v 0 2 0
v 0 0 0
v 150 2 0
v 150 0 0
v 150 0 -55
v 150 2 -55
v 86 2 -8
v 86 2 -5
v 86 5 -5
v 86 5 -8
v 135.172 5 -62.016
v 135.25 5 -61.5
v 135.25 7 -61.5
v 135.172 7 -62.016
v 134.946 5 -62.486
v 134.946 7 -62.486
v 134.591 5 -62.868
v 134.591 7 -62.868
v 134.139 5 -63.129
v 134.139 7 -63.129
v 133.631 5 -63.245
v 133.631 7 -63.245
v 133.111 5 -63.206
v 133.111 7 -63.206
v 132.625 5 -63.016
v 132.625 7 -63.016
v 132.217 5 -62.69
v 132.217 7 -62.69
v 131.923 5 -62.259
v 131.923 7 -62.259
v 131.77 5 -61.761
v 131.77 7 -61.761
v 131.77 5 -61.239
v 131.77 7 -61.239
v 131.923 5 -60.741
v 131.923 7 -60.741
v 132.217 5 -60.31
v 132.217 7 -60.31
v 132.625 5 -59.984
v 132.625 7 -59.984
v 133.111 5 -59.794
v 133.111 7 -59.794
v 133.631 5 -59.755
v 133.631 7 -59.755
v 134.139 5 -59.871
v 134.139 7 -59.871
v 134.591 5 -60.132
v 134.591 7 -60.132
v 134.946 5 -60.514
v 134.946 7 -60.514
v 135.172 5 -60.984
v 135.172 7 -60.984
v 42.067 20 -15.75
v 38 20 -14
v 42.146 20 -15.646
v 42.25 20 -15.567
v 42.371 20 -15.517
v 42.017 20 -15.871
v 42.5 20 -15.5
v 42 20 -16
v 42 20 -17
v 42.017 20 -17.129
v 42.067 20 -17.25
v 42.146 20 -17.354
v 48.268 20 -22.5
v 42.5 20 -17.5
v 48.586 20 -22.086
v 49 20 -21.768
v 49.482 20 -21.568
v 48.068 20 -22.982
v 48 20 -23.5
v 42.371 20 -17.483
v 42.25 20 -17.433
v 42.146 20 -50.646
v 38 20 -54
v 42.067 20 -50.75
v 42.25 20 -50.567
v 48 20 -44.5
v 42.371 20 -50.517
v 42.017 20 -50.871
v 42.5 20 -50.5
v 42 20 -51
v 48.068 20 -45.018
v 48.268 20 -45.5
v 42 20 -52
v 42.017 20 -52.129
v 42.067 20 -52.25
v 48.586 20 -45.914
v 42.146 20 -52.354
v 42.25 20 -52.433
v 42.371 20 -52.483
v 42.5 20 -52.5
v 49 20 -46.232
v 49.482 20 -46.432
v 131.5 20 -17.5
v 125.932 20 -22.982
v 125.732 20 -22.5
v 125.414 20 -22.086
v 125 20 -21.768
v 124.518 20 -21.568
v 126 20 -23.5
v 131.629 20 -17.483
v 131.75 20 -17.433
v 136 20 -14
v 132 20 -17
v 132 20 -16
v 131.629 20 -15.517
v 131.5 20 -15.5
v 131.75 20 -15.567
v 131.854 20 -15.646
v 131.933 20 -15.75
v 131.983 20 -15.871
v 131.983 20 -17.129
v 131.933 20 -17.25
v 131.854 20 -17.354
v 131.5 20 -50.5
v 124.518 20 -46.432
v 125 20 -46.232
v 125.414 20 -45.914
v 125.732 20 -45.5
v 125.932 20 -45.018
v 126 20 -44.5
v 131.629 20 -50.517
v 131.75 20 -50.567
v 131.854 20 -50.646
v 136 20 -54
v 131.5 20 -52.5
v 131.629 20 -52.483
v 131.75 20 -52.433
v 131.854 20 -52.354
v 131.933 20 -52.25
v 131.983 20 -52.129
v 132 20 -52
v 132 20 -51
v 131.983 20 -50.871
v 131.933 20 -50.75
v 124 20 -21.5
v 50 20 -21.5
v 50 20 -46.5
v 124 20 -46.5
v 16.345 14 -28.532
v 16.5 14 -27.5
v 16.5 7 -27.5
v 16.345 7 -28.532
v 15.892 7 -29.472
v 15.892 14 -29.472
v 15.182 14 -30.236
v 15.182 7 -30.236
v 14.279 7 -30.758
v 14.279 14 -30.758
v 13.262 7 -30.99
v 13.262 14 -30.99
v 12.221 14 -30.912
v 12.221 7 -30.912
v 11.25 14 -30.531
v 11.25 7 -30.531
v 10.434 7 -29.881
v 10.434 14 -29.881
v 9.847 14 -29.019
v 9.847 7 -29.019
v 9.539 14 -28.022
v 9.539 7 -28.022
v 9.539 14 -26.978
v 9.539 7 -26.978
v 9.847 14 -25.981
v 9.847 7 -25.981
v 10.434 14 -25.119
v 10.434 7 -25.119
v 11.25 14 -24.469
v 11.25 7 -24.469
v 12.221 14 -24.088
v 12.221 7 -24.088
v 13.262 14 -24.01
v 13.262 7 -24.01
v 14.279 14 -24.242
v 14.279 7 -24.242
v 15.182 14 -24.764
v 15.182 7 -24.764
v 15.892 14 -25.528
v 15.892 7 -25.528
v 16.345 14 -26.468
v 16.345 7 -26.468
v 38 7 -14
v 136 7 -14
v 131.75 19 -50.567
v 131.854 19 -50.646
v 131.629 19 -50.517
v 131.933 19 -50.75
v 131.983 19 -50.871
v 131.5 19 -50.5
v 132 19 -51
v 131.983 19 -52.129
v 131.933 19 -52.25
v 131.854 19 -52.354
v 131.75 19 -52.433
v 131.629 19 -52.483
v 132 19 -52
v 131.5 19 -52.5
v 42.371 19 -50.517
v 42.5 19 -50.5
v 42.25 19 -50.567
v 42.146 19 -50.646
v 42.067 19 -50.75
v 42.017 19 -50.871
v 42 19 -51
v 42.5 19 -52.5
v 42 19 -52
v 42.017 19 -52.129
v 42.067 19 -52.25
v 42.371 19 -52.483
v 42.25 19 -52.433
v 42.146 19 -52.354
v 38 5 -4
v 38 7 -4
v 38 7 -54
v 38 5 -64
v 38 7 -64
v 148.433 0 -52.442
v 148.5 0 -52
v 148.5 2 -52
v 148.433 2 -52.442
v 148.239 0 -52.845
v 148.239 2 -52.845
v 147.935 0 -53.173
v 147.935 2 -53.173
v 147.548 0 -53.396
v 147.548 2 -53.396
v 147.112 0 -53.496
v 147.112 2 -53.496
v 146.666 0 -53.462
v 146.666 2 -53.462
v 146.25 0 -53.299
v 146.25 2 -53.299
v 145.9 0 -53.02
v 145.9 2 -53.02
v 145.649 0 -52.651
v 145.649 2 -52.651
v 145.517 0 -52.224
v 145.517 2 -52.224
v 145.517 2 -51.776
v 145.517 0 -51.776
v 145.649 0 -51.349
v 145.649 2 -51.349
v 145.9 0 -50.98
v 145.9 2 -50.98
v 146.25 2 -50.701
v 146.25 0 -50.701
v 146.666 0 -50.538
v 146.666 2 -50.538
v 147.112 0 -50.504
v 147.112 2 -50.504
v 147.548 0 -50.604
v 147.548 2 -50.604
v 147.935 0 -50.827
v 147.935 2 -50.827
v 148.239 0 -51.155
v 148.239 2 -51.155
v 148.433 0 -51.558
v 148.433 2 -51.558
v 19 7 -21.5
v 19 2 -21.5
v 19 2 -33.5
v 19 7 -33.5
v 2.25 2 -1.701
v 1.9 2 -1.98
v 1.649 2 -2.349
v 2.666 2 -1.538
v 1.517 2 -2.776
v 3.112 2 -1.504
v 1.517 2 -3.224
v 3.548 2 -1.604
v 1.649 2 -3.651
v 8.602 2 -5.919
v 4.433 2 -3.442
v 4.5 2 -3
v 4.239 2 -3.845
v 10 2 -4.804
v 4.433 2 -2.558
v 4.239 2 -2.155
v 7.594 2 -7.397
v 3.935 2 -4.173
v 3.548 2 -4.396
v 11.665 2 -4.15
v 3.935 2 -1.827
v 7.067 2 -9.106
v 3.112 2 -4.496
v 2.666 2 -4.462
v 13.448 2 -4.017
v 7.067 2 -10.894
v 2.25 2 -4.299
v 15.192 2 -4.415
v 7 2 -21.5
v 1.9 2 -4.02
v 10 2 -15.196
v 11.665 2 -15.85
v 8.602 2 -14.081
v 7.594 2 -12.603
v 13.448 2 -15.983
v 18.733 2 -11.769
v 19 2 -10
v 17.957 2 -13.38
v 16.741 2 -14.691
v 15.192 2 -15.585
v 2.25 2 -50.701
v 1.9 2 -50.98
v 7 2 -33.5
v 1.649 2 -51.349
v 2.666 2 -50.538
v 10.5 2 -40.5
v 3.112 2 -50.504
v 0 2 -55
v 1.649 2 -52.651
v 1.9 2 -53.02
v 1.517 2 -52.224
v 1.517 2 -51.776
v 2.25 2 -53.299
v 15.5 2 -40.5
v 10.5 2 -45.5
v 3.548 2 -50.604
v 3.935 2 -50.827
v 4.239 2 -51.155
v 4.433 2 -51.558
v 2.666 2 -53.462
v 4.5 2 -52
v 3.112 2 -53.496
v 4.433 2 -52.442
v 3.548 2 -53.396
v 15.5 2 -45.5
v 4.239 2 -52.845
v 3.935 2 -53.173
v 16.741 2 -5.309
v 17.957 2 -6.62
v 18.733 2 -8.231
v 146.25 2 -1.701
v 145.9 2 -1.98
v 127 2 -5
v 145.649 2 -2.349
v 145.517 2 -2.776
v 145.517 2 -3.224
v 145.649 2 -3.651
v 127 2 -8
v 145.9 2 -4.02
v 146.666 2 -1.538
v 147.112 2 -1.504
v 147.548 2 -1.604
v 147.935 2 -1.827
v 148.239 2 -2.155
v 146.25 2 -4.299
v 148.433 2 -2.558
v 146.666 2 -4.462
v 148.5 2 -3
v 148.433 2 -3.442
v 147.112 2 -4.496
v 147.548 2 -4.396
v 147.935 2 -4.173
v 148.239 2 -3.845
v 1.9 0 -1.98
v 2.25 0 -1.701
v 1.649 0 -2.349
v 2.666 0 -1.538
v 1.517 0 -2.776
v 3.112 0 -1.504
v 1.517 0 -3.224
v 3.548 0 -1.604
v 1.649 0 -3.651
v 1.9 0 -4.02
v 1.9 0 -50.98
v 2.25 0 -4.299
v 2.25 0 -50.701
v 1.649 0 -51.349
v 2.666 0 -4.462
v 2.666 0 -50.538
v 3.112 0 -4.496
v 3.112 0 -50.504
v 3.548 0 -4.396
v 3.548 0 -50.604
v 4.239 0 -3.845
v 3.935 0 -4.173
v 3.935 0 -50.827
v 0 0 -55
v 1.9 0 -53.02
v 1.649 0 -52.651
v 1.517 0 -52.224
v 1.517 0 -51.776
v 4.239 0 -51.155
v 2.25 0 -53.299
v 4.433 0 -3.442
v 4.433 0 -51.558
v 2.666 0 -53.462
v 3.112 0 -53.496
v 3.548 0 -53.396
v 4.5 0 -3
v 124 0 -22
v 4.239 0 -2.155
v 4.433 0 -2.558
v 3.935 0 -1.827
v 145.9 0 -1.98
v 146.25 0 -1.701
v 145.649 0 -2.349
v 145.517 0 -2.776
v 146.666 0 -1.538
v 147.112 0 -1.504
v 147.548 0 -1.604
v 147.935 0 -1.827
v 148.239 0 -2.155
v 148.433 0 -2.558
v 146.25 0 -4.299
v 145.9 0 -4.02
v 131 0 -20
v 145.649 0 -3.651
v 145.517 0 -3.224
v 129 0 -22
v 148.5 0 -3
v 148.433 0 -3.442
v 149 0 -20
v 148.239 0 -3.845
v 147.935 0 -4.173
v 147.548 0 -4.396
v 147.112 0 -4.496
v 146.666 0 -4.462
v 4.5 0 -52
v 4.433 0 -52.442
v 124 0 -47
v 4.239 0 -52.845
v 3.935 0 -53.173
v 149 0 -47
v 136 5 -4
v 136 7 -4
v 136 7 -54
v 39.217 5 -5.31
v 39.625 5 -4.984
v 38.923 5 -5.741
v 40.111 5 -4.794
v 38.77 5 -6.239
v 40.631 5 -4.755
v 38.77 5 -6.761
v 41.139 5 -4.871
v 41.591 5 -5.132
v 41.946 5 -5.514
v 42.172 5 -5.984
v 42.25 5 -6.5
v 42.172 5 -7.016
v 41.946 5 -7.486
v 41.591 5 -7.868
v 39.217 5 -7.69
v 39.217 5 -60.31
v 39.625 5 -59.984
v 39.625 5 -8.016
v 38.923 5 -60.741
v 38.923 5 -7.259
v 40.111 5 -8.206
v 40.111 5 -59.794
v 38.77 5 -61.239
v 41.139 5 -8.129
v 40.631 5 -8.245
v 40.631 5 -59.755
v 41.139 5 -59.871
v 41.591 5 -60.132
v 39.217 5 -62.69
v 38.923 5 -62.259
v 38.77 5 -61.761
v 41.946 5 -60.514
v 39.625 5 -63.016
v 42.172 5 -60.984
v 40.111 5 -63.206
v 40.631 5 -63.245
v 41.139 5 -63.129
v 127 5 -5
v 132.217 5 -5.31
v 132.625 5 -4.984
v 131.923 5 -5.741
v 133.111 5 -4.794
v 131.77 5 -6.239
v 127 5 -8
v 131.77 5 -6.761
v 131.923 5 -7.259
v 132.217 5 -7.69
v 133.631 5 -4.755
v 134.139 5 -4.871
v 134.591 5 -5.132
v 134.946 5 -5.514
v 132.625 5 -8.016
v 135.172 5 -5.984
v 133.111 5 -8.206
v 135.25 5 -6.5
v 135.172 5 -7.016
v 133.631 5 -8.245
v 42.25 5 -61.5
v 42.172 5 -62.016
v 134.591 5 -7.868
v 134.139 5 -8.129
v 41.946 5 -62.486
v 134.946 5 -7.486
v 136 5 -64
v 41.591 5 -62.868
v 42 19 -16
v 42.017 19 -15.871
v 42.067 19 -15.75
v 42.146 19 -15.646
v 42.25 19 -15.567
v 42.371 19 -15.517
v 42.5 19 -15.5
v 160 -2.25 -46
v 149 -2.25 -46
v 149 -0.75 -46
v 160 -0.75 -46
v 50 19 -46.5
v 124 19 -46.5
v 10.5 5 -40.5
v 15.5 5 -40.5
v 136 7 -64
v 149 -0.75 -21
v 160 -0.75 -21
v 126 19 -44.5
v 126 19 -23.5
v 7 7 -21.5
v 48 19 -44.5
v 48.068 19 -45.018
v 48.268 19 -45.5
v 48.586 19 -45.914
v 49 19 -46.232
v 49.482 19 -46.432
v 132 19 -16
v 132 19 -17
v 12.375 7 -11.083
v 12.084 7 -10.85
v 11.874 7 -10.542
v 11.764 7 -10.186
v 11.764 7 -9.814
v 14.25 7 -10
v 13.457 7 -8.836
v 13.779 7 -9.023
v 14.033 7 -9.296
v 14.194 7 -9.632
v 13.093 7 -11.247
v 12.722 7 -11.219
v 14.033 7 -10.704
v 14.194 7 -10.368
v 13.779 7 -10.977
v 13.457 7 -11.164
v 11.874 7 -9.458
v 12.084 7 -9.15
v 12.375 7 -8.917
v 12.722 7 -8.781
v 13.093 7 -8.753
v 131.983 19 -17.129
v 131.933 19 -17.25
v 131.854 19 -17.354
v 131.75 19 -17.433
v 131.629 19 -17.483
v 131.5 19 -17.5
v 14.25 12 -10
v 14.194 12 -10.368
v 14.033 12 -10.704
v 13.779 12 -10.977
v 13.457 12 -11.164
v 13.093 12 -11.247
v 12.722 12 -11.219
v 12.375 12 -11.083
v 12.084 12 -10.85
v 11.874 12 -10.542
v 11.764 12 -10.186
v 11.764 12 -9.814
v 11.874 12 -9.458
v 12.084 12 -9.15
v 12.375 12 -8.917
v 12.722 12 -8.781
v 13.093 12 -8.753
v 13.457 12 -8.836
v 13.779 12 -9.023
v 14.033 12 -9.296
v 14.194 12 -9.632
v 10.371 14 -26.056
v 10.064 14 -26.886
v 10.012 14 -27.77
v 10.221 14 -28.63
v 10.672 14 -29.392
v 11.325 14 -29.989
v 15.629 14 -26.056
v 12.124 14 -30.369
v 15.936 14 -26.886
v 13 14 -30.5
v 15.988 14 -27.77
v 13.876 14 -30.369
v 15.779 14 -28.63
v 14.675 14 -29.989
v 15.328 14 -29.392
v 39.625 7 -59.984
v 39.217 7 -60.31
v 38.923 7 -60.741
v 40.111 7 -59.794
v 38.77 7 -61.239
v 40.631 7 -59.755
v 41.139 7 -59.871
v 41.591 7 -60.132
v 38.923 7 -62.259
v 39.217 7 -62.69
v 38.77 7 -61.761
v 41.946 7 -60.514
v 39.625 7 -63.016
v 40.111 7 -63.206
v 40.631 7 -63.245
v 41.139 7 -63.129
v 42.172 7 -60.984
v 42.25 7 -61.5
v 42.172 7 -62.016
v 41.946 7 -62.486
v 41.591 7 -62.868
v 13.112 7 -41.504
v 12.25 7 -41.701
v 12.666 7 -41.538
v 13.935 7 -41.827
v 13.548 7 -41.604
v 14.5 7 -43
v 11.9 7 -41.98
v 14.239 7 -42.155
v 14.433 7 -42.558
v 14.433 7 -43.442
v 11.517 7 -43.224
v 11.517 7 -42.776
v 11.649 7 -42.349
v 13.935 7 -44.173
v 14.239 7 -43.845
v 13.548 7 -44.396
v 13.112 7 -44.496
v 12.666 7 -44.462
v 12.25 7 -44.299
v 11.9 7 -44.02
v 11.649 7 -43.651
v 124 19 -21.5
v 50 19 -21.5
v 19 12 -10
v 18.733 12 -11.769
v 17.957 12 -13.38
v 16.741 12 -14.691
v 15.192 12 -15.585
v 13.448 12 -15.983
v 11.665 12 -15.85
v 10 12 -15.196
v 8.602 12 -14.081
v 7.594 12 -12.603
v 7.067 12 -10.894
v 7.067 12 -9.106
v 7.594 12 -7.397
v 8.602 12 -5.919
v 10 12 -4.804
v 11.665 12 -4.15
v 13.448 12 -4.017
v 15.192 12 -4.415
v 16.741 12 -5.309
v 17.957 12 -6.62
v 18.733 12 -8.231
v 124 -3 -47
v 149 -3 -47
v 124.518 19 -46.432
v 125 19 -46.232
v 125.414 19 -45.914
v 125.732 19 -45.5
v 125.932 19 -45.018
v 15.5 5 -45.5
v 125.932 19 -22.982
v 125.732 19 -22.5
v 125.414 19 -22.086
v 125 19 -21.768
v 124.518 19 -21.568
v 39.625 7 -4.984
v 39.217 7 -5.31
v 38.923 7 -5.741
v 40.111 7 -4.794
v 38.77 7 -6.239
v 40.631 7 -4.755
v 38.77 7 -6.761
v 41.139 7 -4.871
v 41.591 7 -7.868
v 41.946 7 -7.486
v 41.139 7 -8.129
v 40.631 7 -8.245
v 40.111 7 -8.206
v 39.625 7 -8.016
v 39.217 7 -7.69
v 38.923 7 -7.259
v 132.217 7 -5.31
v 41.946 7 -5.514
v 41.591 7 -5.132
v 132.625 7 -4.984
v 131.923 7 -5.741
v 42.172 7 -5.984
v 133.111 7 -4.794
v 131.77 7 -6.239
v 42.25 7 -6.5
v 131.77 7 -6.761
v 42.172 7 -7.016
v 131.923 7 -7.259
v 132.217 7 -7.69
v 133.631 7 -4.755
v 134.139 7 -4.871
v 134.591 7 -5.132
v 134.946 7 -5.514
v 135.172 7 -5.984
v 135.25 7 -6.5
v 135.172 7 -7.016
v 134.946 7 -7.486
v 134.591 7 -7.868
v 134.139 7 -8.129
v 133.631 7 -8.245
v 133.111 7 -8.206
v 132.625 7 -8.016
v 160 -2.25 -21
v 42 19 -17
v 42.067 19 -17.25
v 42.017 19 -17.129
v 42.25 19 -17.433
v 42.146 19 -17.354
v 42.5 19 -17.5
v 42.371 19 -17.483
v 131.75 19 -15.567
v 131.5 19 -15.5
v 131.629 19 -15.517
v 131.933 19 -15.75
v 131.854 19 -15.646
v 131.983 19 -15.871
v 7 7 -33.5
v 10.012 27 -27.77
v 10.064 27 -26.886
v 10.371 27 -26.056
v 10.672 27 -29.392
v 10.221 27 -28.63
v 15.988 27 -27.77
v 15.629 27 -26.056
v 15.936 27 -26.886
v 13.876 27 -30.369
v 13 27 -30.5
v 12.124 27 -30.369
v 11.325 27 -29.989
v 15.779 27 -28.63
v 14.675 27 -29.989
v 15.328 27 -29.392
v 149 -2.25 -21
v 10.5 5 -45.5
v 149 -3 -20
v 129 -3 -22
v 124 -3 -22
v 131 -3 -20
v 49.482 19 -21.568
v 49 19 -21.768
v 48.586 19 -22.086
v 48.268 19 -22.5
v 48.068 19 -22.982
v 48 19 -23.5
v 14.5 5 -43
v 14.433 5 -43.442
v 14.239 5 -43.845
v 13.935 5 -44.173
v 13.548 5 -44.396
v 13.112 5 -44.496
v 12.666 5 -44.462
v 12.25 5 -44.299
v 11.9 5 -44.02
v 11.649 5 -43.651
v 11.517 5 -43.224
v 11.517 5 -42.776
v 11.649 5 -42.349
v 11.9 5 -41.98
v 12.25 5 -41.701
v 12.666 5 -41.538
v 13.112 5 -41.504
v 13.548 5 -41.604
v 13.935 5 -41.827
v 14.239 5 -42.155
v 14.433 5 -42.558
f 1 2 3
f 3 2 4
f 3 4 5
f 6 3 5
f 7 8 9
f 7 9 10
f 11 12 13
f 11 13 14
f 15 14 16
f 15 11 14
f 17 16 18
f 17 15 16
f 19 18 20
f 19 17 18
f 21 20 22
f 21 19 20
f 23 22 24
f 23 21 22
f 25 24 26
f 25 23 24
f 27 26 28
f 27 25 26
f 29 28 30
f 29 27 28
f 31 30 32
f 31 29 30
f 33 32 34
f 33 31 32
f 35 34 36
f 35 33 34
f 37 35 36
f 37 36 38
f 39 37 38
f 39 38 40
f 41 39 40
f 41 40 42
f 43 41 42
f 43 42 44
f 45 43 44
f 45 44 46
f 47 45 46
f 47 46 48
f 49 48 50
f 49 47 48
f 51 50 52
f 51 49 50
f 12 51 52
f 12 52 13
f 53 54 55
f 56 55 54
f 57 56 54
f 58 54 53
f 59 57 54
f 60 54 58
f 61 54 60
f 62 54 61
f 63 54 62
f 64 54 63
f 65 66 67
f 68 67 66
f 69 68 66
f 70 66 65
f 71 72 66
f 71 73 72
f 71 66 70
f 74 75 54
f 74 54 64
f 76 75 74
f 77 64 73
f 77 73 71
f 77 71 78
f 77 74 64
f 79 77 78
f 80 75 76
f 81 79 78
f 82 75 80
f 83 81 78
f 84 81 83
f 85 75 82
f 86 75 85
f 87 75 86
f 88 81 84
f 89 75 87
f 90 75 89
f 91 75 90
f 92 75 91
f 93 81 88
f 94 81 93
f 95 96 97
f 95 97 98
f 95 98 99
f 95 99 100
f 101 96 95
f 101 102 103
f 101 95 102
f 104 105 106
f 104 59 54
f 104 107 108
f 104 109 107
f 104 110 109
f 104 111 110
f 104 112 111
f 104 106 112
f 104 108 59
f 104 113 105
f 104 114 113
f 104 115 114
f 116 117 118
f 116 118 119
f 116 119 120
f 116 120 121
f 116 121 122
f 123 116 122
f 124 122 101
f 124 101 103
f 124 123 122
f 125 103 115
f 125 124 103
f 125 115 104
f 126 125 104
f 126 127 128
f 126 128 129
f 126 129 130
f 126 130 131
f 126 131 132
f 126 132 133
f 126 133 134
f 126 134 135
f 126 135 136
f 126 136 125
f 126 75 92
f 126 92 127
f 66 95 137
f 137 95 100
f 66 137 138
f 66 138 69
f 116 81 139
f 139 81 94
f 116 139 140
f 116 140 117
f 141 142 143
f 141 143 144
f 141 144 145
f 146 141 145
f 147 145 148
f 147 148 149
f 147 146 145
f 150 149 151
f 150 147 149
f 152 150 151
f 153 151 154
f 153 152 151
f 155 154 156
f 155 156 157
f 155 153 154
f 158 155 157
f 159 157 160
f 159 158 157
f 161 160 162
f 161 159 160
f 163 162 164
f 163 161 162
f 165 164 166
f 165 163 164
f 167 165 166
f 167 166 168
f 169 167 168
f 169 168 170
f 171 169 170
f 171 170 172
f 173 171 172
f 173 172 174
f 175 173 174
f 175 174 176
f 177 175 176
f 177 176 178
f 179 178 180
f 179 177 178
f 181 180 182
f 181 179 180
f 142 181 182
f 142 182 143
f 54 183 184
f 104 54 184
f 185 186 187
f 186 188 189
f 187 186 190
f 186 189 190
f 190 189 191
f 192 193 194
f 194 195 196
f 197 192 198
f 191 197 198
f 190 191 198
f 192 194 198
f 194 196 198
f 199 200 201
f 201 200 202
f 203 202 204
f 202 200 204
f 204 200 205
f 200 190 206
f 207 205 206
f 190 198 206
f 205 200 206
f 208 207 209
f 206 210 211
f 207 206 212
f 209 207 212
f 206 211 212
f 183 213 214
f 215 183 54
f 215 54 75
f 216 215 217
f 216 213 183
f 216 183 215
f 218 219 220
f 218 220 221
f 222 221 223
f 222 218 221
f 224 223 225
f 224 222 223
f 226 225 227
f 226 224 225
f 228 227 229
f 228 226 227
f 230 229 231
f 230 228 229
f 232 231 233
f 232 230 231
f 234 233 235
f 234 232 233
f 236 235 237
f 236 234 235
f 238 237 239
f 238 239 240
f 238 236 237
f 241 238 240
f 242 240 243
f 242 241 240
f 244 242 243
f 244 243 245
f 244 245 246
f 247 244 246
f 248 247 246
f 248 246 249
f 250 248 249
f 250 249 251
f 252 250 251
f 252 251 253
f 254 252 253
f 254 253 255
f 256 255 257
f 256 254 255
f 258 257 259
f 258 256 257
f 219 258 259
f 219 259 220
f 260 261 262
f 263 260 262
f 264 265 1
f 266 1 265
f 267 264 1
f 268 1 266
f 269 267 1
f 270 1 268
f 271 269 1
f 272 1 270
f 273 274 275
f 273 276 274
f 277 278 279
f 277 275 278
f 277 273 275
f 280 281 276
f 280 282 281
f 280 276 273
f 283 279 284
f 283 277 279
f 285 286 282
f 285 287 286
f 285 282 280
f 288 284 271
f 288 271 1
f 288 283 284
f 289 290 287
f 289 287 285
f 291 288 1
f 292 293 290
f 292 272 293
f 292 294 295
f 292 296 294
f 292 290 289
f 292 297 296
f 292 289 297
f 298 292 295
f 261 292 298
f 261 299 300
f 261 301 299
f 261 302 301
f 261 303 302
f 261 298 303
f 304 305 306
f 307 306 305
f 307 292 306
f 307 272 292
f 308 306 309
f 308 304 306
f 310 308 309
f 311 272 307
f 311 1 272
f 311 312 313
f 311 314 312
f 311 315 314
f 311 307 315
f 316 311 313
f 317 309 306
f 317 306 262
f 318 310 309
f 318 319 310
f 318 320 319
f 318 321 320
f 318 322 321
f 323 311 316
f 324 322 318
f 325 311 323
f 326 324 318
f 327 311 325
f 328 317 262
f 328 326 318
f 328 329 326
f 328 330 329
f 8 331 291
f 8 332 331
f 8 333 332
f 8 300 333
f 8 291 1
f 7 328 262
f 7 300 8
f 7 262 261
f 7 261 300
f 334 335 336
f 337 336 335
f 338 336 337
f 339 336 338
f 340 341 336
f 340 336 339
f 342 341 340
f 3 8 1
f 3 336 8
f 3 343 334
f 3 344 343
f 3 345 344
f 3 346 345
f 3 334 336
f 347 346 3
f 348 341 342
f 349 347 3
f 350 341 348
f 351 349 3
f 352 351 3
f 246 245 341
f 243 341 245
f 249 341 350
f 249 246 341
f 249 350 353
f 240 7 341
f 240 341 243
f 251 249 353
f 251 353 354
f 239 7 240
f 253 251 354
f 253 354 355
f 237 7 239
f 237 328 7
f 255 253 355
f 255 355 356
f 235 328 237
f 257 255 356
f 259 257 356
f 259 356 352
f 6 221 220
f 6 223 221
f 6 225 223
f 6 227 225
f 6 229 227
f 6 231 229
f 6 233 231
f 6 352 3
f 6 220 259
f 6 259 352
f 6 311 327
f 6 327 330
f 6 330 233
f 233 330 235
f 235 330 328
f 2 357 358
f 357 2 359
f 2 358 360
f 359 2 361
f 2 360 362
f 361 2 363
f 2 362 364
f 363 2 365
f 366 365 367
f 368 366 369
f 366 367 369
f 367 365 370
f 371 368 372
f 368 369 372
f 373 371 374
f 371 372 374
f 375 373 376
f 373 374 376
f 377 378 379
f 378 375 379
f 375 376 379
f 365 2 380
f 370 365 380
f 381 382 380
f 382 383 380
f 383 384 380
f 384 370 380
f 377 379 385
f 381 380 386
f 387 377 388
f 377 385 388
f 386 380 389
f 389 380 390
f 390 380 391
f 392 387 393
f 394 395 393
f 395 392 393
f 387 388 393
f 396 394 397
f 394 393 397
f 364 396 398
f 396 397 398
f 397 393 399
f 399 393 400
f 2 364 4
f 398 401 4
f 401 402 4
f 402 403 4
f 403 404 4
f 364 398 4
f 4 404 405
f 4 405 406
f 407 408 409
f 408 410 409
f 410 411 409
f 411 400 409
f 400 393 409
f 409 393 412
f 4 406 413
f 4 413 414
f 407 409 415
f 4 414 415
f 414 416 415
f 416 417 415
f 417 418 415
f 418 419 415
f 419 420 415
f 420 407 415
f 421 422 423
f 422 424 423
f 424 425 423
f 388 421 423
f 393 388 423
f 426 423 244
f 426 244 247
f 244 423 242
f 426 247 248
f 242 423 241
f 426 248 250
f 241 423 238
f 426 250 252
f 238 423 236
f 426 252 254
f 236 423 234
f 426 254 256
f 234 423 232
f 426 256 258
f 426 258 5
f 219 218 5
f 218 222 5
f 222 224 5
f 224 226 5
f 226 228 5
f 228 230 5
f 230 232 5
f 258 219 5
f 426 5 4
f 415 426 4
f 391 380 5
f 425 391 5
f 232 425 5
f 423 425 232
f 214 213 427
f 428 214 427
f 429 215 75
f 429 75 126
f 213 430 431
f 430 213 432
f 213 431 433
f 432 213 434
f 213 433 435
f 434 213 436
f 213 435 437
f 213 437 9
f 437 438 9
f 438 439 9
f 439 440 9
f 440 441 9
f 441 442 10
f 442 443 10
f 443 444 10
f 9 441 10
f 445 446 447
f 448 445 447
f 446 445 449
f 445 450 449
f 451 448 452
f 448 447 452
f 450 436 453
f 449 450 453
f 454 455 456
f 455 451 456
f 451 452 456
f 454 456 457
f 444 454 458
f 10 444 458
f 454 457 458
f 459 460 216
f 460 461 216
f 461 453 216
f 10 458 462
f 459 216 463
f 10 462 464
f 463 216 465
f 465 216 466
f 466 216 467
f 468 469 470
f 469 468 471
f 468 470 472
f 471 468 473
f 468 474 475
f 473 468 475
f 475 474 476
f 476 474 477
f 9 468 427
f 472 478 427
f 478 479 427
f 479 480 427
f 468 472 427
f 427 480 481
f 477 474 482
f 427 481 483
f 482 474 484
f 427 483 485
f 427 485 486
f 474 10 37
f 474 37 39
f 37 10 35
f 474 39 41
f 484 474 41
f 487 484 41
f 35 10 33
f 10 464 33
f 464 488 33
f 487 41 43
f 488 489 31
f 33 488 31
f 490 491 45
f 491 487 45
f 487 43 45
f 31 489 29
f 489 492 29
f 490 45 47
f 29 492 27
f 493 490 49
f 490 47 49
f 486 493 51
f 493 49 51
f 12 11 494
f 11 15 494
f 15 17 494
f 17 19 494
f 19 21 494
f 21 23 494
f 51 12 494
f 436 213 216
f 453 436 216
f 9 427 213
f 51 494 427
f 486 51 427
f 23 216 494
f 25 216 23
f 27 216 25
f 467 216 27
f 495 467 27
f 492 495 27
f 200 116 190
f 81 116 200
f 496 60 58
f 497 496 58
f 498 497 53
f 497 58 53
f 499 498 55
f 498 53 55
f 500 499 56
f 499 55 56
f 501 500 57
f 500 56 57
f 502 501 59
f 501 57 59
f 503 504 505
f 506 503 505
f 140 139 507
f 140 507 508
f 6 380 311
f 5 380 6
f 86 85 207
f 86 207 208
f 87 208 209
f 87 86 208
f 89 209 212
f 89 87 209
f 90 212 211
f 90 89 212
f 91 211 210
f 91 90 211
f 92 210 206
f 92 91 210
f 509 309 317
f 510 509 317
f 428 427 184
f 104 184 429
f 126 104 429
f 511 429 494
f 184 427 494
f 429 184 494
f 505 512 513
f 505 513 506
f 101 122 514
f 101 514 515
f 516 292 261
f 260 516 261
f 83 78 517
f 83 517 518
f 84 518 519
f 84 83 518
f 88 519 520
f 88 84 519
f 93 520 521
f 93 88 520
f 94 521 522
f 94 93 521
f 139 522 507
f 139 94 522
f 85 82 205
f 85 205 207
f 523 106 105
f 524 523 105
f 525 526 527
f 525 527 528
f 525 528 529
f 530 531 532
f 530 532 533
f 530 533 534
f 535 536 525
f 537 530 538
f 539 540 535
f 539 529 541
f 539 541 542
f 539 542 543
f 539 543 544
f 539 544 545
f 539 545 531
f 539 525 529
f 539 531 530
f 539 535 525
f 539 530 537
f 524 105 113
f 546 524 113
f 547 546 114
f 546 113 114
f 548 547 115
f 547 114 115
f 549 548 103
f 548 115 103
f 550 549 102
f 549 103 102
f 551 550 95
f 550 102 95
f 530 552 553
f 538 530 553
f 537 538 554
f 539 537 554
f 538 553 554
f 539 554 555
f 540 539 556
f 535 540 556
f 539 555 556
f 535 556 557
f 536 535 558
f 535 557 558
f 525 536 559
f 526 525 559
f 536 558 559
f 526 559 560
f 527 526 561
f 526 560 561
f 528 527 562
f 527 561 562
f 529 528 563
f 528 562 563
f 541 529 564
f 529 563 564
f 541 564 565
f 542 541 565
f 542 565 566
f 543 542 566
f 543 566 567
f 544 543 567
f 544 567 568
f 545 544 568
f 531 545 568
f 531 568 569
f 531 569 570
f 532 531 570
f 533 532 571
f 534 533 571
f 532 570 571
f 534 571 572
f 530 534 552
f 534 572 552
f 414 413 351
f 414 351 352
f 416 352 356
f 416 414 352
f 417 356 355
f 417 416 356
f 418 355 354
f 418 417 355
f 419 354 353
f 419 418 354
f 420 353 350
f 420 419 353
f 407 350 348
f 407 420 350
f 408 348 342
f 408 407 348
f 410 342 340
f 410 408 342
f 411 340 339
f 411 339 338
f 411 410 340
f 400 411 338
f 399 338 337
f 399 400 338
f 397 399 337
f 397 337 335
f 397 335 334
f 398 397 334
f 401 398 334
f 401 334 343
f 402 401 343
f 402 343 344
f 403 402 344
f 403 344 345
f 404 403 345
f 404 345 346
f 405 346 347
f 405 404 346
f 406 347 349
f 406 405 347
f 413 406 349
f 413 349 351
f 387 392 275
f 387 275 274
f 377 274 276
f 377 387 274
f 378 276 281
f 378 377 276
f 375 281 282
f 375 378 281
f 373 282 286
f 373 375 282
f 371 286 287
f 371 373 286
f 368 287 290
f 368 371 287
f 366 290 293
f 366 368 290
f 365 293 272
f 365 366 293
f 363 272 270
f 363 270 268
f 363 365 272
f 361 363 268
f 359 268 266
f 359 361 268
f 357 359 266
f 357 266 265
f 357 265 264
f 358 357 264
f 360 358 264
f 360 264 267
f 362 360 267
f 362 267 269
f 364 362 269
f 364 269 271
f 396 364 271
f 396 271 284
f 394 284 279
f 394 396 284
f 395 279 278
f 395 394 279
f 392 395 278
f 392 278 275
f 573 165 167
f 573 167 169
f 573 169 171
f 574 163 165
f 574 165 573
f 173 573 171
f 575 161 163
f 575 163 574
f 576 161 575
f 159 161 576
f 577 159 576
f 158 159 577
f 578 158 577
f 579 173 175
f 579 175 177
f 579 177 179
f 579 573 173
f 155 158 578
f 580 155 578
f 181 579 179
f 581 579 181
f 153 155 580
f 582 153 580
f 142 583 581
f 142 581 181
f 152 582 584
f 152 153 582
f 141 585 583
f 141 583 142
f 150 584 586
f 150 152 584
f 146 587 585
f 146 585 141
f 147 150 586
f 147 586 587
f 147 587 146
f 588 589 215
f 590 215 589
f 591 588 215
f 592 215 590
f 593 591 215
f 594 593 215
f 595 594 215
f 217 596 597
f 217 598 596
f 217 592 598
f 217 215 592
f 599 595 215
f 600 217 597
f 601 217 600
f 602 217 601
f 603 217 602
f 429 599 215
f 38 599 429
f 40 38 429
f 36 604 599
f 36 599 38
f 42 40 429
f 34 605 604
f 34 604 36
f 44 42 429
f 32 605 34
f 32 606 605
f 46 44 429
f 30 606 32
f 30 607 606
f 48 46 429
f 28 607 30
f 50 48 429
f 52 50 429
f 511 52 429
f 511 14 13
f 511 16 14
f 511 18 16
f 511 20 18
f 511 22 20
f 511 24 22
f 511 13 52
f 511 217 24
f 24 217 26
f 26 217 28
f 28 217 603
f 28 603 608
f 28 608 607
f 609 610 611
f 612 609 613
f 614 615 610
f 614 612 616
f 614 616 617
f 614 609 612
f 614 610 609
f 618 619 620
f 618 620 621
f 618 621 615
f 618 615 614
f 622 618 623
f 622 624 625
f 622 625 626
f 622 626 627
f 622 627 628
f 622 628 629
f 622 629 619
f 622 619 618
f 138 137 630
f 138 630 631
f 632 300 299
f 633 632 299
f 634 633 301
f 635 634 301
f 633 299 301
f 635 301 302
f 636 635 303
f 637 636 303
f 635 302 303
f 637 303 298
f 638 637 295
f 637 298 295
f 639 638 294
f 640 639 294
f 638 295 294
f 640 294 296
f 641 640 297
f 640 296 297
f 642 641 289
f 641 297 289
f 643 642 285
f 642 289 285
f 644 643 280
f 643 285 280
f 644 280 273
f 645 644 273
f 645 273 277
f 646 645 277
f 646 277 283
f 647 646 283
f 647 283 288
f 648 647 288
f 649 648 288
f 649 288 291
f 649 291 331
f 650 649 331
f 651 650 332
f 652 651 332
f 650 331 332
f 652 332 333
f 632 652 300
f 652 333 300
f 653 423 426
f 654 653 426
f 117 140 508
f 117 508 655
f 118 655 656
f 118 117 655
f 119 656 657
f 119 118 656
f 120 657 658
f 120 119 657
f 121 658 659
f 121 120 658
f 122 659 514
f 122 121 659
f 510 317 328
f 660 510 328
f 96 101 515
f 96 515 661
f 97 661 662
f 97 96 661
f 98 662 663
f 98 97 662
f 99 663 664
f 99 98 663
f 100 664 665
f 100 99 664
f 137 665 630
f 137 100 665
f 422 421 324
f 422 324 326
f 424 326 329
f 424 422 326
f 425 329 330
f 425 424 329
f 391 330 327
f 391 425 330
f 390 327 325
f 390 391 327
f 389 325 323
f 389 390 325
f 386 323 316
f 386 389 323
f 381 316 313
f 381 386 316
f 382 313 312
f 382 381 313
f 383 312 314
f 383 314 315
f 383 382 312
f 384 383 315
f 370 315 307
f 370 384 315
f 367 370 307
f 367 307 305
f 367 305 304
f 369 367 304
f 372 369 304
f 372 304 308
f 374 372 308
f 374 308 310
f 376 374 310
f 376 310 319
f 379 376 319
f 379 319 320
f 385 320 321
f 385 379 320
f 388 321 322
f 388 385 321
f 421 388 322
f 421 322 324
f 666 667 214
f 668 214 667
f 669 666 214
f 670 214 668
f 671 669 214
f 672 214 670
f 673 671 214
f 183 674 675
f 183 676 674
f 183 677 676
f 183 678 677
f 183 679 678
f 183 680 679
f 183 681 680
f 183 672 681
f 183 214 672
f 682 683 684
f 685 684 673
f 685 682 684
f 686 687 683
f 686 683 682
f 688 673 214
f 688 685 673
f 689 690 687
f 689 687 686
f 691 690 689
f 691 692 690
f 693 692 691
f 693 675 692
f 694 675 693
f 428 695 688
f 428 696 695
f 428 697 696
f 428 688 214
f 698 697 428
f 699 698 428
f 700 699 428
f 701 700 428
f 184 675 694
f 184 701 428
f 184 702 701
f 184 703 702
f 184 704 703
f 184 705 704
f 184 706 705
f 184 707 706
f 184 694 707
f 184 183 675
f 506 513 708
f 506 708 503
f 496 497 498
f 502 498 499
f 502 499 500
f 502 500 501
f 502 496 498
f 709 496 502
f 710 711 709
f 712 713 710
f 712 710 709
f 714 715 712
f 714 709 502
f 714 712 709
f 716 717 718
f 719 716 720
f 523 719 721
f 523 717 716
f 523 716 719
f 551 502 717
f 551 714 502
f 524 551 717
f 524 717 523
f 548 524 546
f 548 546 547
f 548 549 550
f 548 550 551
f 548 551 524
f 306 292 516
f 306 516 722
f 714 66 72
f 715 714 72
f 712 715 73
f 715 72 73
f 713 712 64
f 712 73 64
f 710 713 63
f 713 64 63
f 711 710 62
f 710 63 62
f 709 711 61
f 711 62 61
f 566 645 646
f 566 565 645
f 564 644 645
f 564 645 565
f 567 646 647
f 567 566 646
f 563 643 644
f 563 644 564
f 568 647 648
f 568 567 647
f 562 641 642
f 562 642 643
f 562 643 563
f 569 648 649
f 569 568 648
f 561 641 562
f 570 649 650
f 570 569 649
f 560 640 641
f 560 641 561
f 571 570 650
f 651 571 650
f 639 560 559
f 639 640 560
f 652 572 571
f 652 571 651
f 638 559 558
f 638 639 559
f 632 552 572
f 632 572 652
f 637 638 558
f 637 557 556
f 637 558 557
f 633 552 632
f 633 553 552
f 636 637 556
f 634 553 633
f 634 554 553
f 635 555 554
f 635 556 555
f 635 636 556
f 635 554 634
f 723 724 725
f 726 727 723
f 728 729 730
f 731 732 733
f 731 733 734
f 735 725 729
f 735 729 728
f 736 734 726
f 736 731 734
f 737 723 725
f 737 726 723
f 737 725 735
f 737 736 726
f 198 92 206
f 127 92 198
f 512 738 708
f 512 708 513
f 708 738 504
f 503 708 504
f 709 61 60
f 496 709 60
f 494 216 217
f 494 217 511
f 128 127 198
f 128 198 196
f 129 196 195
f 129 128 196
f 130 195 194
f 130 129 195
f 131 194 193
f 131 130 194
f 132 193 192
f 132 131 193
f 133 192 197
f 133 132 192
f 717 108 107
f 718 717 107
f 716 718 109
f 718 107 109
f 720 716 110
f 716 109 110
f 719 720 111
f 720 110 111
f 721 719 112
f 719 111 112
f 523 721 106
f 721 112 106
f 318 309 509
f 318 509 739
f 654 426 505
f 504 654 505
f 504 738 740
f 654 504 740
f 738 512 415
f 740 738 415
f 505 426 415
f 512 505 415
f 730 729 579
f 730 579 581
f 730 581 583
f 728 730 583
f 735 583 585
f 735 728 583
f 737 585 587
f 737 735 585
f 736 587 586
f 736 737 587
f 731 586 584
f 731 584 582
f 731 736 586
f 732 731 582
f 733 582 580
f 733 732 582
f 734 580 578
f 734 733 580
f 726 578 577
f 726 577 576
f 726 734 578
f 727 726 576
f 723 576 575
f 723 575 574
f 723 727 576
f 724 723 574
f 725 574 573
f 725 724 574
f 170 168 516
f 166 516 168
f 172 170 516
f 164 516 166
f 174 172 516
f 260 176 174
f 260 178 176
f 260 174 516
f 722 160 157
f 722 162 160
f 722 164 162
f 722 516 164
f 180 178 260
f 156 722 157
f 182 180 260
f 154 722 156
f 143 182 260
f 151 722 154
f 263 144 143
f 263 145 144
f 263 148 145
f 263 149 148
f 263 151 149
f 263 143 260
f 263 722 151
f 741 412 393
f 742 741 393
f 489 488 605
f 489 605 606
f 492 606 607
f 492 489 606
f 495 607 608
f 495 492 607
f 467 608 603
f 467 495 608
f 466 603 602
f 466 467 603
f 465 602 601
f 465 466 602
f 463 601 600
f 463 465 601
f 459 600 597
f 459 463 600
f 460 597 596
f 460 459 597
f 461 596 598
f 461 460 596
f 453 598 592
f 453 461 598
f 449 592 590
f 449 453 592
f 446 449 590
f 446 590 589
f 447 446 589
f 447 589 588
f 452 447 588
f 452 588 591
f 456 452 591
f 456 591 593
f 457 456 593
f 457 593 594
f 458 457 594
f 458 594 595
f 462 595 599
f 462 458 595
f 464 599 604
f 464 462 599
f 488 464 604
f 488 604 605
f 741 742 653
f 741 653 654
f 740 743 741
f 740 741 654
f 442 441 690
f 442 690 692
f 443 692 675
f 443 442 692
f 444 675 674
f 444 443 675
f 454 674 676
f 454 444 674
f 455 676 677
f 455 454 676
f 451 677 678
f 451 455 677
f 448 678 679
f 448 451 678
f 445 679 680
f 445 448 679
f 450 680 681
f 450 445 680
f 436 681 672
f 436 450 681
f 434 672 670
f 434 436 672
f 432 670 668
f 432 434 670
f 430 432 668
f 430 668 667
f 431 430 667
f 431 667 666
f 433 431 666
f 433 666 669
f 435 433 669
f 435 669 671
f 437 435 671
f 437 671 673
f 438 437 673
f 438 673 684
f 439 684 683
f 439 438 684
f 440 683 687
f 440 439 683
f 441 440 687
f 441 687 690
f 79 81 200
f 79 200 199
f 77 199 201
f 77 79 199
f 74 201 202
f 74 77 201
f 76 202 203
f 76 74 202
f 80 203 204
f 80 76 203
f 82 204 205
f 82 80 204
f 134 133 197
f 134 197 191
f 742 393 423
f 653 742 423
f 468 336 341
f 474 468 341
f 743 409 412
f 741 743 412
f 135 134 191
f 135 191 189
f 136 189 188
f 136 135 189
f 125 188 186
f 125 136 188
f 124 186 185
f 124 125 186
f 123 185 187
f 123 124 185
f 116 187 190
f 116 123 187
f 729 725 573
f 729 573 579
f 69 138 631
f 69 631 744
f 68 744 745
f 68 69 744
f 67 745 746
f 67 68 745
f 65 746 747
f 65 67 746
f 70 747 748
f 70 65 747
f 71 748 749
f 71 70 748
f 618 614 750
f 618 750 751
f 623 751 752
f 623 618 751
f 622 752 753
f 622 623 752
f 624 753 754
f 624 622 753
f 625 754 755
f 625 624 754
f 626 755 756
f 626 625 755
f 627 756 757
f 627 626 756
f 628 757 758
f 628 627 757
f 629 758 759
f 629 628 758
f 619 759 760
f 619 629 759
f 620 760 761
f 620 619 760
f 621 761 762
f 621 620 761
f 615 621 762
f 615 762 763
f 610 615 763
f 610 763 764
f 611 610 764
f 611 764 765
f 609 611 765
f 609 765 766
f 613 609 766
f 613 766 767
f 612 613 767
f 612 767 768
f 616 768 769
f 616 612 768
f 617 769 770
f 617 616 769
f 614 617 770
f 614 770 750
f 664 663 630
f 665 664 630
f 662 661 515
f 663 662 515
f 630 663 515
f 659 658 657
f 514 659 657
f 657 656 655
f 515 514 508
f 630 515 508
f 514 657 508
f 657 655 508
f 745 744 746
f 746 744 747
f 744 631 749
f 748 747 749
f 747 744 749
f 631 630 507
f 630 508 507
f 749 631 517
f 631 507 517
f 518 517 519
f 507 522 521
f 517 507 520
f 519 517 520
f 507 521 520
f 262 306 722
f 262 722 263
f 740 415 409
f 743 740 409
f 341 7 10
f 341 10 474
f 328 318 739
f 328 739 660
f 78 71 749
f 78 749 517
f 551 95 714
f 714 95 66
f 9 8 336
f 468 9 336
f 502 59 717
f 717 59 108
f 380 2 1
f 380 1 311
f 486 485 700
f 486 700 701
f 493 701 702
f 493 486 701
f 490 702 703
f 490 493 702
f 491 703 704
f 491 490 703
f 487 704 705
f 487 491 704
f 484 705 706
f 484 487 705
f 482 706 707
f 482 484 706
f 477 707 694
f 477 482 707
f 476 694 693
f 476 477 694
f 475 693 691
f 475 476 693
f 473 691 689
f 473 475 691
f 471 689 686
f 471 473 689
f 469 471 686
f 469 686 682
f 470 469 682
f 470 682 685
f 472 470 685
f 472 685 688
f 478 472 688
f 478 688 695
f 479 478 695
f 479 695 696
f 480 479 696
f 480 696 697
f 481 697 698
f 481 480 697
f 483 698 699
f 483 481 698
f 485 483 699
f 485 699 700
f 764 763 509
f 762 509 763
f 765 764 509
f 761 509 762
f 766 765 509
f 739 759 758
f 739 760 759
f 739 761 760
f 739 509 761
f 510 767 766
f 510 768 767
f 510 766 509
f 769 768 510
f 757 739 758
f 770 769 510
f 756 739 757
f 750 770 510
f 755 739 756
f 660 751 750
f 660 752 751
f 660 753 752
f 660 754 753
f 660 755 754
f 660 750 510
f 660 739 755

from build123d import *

# Parameters (mm, degrees)
SKETCH1_W           = 150
SKETCH1_H           = 55
SKETCH1_R           = 1.5
BOSS_EXTRUDE1_DEPTH = 2
SKETCH2_R           = 6
BOSS_EXTRUDE2_DEPTH = 10
SKETCH3_W           = 12
SKETCH3_H           = 12
BOSS_EXTRUDE3_DEPTH = 25
SKETCH4_W           = 5
SKETCH4_H           = 5
SKETCH4_W_2         = 41
SKETCH4_H_2         = 3
BOSS_EXTRUDE4_DEPTH = 5
SKETCH5_W           = 41
SKETCH5_H           = 3
SKETCH5_W_2         = 5
SKETCH5_H_2         = 5
SKETCH5_R           = 1.5
CUT_EXTRUDE1_DEPTH  = 2
SKETCH6_W           = 12
SKETCH6_H           = 12
CUT_EXTRUDE2_DEPTH  = 13
SKETCH7_W           = 12
SKETCH7_H           = 12
SKETCH7_R           = 3.5
CUT_EXTRUDE3_DEPTH  = 7
SKETCH8_R           = 1.25
CUT_EXTRUDE4_DEPTH  = 5
BOSS_EXTRUDE5_DEPTH = 3
SKETCH10_W          = 25
SKETCH10_H          = 1.5
CUT_EXTRUDE5_DEPTH  = 18
SKETCH11_W          = 98
SKETCH11_H          = 60
SKETCH11_R          = 1.75
BOSS_EXTRUDE6_DEPTH = 2
SKETCH12_W          = 98
SKETCH12_H          = 40
BOSS_EXTRUDE7_DEPTH = 13
CUT_EXTRUDE6_DEPTH  = 1
SKETCH14_W          = 25
SKETCH14_H          = 1.5
BOSS_EXTRUDE8_DEPTH = 29


with BuildPart() as part:
    # Sketch1 → Boss-Extrude1 (new body)
    with BuildSketch(Plane(origin=(0, 0, 0), x_dir=(1, 0, 0), z_dir=(0, 1, 0))):
        with Locations((75, 27.5)):
            Rectangle(SKETCH1_W, SKETCH1_H)
        with Locations((3, 52)):
            Circle(SKETCH1_R, mode=Mode.SUBTRACT)
        with Locations((147, 52)):
            Circle(SKETCH1_R, mode=Mode.SUBTRACT)
        with Locations((147, 3)):
            Circle(SKETCH1_R, mode=Mode.SUBTRACT)
        with Locations((3, 3)):
            Circle(SKETCH1_R, mode=Mode.SUBTRACT)
    extrude(amount=BOSS_EXTRUDE1_DEPTH)

    # Sketch2 → Boss-Extrude2 (add)
    with BuildSketch(Plane(origin=(0, 2, 0), x_dir=(1, 0, 0), z_dir=(0, 1, 0))):
        with Locations((13, 10)):
            Circle(SKETCH2_R)
    extrude(amount=BOSS_EXTRUDE2_DEPTH)

    # Sketch3 → Boss-Extrude3 (add)
    with BuildSketch(Plane(origin=(0, 2, 0), x_dir=(1, 0, 0), z_dir=(0, 1, 0))):
        with Locations((13, 27.5)):
            Rectangle(SKETCH3_W, SKETCH3_H)
    extrude(amount=BOSS_EXTRUDE3_DEPTH)

    # Sketch4 → Boss-Extrude4 (add)
    with BuildSketch(Plane(origin=(0, 2, 0), x_dir=(1, 0, 0), z_dir=(0, 1, 0))):
        with Locations((13, 43)):
            Rectangle(SKETCH4_W, SKETCH4_H)
        with Locations((106.5, 6.5)):
            Rectangle(SKETCH4_W_2, SKETCH4_H_2)
    extrude(amount=BOSS_EXTRUDE4_DEPTH)

    # Sketch5 → Cut-Extrude1 (cut)
    with BuildSketch(Plane(origin=(0, 7, 0), x_dir=(1, 0, 0), z_dir=(0, 1, 0))):
        with Locations((106.5, 6.5)):
            Rectangle(SKETCH5_W, SKETCH5_H)
        with Locations((13, 43)):
            Rectangle(SKETCH5_W_2, SKETCH5_H_2)
        with Locations((13, 43)):
            Circle(SKETCH5_R, mode=Mode.SUBTRACT)
    extrude(amount=-CUT_EXTRUDE1_DEPTH, mode=Mode.SUBTRACT)

    # Sketch6 → Cut-Extrude2 (cut)
    with BuildSketch(Plane(origin=(0, 27, 0), x_dir=(1, 0, 0), z_dir=(0, 1, 0))):
        with Locations((13, 27.5)):
            Rectangle(SKETCH6_W, SKETCH6_H)
        with BuildLine():
            Line((10.370614338, 26.055586264), (15.629385662, 26.055586264))
            ThreePointArc((15.629385662, 26.055586264), (13, 30.5), (10.370614338, 26.055586264))
        make_face(mode=Mode.SUBTRACT)
    extrude(amount=-CUT_EXTRUDE2_DEPTH, mode=Mode.SUBTRACT)

    # Sketch7 → Cut-Extrude3 (cut)
    with BuildSketch(Plane(origin=(0, 14, 0), x_dir=(1, 0, 0), z_dir=(0, 1, 0))):
        with Locations((13, 27.5)):
            Rectangle(SKETCH7_W, SKETCH7_H)
        with Locations((13, 27.5)):
            Circle(SKETCH7_R, mode=Mode.SUBTRACT)
    extrude(amount=-CUT_EXTRUDE3_DEPTH, mode=Mode.SUBTRACT)

    # Sketch8 → Cut-Extrude4 (cut)
    with BuildSketch(Plane(origin=(0, 12, 0), x_dir=(1, 0, 0), z_dir=(0, 1, 0))):
        with Locations((13, 10)):
            Circle(SKETCH8_R)
    extrude(amount=-CUT_EXTRUDE4_DEPTH, mode=Mode.SUBTRACT)

    # Sketch9 → Boss-Extrude5 (add)
    with BuildSketch(Plane.XZ):
        Polygon((149, -20), (131, -20), (129, -22), (124, -22), (124, -47), (149, -47), align=None)
    extrude(amount=BOSS_EXTRUDE5_DEPTH)

    # Sketch10 → Cut-Extrude5 (cut)
    with BuildSketch(Plane(origin=(149, 0, 0), x_dir=(0, 0, -1), z_dir=(1, 0, 0))):
        with Locations((33.5, -1.5)):
            Rectangle(SKETCH10_W, SKETCH10_H)
    extrude(amount=-CUT_EXTRUDE5_DEPTH, mode=Mode.SUBTRACT)

    # Sketch11 → Boss-Extrude6 (add)
    with BuildSketch(Plane(origin=(0, 5, 0), x_dir=(1, 0, 0), z_dir=(0, 1, 0))):
        with Locations((87, 34)):
            Rectangle(SKETCH11_W, SKETCH11_H)
        with Locations((40.5, 61.5)):
            Circle(SKETCH11_R, mode=Mode.SUBTRACT)
        with Locations((133.5, 61.5)):
            Circle(SKETCH11_R, mode=Mode.SUBTRACT)
        with Locations((133.5, 6.5)):
            Circle(SKETCH11_R, mode=Mode.SUBTRACT)
        with Locations((40.5, 6.5)):
            Circle(SKETCH11_R, mode=Mode.SUBTRACT)
    extrude(amount=BOSS_EXTRUDE6_DEPTH)

    # Sketch12 → Boss-Extrude7 (add)
    with BuildSketch(Plane(origin=(0, 7, 0), x_dir=(1, 0, 0), z_dir=(0, 1, 0))):
        with Locations((87, 34)):
            Rectangle(SKETCH12_W, SKETCH12_H)
    extrude(amount=BOSS_EXTRUDE7_DEPTH)

    # Sketch13 → Cut-Extrude6 (cut)
    with BuildSketch(Plane(origin=(0, 20, 0), x_dir=(1, 0, 0), z_dir=(0, 1, 0))):
        with BuildLine():
            Line((50, 46.5), (124, 46.5))
            ThreePointArc((124, 46.5), (125.414213562, 45.914213562), (126, 44.5))
            Line((126, 44.5), (126, 23.5))
            ThreePointArc((126, 23.5), (125.414213562, 22.085786438), (124, 21.5))
            Line((124, 21.5), (50, 21.5))
            ThreePointArc((50, 21.5), (48.585786438, 22.085786438), (48, 23.5))
            Line((48, 23.5), (48, 44.5))
            ThreePointArc((48, 44.5), (48.585786438, 45.914213562), (50, 46.5))
        make_face()
        with BuildLine():
            Line((42.5, 52.5), (131.5, 52.5))
            ThreePointArc((131.5, 52.5), (131.853553391, 52.353553391), (132, 52))
            Line((132, 52), (132, 51))
            ThreePointArc((132, 51), (131.853553391, 50.646446609), (131.5, 50.5))
            Line((131.5, 50.5), (42.5, 50.5))
            ThreePointArc((42.5, 50.5), (42.146446609, 50.646446609), (42, 51))
            Line((42, 51), (42, 52))
            ThreePointArc((42, 52), (42.146446609, 52.353553391), (42.5, 52.5))
        make_face()
        with BuildLine():
            Line((132, 16), (132, 17))
            ThreePointArc((132, 17), (131.853553391, 17.353553391), (131.5, 17.5))
            Line((131.5, 17.5), (42.5, 17.5))
            ThreePointArc((42.5, 17.5), (42.146446609, 17.353553391), (42, 17))
            Line((42, 17), (42, 16))
            ThreePointArc((42, 16), (42.146446609, 15.646446609), (42.5, 15.5))
            Line((42.5, 15.5), (131.5, 15.5))
            ThreePointArc((131.5, 15.5), (131.853553391, 15.646446609), (132, 16))
        make_face()
    extrude(amount=-CUT_EXTRUDE6_DEPTH, mode=Mode.SUBTRACT)

    # Sketch14 → Boss-Extrude8 (add)
    with BuildSketch(Plane(origin=(131, 0, 0), x_dir=(0, 0, -1), z_dir=(1, 0, 0))):
        with Locations((33.5, -1.5)):
            Rectangle(SKETCH14_W, SKETCH14_H)
    extrude(amount=BOSS_EXTRUDE8_DEPTH)


solid = part.part
